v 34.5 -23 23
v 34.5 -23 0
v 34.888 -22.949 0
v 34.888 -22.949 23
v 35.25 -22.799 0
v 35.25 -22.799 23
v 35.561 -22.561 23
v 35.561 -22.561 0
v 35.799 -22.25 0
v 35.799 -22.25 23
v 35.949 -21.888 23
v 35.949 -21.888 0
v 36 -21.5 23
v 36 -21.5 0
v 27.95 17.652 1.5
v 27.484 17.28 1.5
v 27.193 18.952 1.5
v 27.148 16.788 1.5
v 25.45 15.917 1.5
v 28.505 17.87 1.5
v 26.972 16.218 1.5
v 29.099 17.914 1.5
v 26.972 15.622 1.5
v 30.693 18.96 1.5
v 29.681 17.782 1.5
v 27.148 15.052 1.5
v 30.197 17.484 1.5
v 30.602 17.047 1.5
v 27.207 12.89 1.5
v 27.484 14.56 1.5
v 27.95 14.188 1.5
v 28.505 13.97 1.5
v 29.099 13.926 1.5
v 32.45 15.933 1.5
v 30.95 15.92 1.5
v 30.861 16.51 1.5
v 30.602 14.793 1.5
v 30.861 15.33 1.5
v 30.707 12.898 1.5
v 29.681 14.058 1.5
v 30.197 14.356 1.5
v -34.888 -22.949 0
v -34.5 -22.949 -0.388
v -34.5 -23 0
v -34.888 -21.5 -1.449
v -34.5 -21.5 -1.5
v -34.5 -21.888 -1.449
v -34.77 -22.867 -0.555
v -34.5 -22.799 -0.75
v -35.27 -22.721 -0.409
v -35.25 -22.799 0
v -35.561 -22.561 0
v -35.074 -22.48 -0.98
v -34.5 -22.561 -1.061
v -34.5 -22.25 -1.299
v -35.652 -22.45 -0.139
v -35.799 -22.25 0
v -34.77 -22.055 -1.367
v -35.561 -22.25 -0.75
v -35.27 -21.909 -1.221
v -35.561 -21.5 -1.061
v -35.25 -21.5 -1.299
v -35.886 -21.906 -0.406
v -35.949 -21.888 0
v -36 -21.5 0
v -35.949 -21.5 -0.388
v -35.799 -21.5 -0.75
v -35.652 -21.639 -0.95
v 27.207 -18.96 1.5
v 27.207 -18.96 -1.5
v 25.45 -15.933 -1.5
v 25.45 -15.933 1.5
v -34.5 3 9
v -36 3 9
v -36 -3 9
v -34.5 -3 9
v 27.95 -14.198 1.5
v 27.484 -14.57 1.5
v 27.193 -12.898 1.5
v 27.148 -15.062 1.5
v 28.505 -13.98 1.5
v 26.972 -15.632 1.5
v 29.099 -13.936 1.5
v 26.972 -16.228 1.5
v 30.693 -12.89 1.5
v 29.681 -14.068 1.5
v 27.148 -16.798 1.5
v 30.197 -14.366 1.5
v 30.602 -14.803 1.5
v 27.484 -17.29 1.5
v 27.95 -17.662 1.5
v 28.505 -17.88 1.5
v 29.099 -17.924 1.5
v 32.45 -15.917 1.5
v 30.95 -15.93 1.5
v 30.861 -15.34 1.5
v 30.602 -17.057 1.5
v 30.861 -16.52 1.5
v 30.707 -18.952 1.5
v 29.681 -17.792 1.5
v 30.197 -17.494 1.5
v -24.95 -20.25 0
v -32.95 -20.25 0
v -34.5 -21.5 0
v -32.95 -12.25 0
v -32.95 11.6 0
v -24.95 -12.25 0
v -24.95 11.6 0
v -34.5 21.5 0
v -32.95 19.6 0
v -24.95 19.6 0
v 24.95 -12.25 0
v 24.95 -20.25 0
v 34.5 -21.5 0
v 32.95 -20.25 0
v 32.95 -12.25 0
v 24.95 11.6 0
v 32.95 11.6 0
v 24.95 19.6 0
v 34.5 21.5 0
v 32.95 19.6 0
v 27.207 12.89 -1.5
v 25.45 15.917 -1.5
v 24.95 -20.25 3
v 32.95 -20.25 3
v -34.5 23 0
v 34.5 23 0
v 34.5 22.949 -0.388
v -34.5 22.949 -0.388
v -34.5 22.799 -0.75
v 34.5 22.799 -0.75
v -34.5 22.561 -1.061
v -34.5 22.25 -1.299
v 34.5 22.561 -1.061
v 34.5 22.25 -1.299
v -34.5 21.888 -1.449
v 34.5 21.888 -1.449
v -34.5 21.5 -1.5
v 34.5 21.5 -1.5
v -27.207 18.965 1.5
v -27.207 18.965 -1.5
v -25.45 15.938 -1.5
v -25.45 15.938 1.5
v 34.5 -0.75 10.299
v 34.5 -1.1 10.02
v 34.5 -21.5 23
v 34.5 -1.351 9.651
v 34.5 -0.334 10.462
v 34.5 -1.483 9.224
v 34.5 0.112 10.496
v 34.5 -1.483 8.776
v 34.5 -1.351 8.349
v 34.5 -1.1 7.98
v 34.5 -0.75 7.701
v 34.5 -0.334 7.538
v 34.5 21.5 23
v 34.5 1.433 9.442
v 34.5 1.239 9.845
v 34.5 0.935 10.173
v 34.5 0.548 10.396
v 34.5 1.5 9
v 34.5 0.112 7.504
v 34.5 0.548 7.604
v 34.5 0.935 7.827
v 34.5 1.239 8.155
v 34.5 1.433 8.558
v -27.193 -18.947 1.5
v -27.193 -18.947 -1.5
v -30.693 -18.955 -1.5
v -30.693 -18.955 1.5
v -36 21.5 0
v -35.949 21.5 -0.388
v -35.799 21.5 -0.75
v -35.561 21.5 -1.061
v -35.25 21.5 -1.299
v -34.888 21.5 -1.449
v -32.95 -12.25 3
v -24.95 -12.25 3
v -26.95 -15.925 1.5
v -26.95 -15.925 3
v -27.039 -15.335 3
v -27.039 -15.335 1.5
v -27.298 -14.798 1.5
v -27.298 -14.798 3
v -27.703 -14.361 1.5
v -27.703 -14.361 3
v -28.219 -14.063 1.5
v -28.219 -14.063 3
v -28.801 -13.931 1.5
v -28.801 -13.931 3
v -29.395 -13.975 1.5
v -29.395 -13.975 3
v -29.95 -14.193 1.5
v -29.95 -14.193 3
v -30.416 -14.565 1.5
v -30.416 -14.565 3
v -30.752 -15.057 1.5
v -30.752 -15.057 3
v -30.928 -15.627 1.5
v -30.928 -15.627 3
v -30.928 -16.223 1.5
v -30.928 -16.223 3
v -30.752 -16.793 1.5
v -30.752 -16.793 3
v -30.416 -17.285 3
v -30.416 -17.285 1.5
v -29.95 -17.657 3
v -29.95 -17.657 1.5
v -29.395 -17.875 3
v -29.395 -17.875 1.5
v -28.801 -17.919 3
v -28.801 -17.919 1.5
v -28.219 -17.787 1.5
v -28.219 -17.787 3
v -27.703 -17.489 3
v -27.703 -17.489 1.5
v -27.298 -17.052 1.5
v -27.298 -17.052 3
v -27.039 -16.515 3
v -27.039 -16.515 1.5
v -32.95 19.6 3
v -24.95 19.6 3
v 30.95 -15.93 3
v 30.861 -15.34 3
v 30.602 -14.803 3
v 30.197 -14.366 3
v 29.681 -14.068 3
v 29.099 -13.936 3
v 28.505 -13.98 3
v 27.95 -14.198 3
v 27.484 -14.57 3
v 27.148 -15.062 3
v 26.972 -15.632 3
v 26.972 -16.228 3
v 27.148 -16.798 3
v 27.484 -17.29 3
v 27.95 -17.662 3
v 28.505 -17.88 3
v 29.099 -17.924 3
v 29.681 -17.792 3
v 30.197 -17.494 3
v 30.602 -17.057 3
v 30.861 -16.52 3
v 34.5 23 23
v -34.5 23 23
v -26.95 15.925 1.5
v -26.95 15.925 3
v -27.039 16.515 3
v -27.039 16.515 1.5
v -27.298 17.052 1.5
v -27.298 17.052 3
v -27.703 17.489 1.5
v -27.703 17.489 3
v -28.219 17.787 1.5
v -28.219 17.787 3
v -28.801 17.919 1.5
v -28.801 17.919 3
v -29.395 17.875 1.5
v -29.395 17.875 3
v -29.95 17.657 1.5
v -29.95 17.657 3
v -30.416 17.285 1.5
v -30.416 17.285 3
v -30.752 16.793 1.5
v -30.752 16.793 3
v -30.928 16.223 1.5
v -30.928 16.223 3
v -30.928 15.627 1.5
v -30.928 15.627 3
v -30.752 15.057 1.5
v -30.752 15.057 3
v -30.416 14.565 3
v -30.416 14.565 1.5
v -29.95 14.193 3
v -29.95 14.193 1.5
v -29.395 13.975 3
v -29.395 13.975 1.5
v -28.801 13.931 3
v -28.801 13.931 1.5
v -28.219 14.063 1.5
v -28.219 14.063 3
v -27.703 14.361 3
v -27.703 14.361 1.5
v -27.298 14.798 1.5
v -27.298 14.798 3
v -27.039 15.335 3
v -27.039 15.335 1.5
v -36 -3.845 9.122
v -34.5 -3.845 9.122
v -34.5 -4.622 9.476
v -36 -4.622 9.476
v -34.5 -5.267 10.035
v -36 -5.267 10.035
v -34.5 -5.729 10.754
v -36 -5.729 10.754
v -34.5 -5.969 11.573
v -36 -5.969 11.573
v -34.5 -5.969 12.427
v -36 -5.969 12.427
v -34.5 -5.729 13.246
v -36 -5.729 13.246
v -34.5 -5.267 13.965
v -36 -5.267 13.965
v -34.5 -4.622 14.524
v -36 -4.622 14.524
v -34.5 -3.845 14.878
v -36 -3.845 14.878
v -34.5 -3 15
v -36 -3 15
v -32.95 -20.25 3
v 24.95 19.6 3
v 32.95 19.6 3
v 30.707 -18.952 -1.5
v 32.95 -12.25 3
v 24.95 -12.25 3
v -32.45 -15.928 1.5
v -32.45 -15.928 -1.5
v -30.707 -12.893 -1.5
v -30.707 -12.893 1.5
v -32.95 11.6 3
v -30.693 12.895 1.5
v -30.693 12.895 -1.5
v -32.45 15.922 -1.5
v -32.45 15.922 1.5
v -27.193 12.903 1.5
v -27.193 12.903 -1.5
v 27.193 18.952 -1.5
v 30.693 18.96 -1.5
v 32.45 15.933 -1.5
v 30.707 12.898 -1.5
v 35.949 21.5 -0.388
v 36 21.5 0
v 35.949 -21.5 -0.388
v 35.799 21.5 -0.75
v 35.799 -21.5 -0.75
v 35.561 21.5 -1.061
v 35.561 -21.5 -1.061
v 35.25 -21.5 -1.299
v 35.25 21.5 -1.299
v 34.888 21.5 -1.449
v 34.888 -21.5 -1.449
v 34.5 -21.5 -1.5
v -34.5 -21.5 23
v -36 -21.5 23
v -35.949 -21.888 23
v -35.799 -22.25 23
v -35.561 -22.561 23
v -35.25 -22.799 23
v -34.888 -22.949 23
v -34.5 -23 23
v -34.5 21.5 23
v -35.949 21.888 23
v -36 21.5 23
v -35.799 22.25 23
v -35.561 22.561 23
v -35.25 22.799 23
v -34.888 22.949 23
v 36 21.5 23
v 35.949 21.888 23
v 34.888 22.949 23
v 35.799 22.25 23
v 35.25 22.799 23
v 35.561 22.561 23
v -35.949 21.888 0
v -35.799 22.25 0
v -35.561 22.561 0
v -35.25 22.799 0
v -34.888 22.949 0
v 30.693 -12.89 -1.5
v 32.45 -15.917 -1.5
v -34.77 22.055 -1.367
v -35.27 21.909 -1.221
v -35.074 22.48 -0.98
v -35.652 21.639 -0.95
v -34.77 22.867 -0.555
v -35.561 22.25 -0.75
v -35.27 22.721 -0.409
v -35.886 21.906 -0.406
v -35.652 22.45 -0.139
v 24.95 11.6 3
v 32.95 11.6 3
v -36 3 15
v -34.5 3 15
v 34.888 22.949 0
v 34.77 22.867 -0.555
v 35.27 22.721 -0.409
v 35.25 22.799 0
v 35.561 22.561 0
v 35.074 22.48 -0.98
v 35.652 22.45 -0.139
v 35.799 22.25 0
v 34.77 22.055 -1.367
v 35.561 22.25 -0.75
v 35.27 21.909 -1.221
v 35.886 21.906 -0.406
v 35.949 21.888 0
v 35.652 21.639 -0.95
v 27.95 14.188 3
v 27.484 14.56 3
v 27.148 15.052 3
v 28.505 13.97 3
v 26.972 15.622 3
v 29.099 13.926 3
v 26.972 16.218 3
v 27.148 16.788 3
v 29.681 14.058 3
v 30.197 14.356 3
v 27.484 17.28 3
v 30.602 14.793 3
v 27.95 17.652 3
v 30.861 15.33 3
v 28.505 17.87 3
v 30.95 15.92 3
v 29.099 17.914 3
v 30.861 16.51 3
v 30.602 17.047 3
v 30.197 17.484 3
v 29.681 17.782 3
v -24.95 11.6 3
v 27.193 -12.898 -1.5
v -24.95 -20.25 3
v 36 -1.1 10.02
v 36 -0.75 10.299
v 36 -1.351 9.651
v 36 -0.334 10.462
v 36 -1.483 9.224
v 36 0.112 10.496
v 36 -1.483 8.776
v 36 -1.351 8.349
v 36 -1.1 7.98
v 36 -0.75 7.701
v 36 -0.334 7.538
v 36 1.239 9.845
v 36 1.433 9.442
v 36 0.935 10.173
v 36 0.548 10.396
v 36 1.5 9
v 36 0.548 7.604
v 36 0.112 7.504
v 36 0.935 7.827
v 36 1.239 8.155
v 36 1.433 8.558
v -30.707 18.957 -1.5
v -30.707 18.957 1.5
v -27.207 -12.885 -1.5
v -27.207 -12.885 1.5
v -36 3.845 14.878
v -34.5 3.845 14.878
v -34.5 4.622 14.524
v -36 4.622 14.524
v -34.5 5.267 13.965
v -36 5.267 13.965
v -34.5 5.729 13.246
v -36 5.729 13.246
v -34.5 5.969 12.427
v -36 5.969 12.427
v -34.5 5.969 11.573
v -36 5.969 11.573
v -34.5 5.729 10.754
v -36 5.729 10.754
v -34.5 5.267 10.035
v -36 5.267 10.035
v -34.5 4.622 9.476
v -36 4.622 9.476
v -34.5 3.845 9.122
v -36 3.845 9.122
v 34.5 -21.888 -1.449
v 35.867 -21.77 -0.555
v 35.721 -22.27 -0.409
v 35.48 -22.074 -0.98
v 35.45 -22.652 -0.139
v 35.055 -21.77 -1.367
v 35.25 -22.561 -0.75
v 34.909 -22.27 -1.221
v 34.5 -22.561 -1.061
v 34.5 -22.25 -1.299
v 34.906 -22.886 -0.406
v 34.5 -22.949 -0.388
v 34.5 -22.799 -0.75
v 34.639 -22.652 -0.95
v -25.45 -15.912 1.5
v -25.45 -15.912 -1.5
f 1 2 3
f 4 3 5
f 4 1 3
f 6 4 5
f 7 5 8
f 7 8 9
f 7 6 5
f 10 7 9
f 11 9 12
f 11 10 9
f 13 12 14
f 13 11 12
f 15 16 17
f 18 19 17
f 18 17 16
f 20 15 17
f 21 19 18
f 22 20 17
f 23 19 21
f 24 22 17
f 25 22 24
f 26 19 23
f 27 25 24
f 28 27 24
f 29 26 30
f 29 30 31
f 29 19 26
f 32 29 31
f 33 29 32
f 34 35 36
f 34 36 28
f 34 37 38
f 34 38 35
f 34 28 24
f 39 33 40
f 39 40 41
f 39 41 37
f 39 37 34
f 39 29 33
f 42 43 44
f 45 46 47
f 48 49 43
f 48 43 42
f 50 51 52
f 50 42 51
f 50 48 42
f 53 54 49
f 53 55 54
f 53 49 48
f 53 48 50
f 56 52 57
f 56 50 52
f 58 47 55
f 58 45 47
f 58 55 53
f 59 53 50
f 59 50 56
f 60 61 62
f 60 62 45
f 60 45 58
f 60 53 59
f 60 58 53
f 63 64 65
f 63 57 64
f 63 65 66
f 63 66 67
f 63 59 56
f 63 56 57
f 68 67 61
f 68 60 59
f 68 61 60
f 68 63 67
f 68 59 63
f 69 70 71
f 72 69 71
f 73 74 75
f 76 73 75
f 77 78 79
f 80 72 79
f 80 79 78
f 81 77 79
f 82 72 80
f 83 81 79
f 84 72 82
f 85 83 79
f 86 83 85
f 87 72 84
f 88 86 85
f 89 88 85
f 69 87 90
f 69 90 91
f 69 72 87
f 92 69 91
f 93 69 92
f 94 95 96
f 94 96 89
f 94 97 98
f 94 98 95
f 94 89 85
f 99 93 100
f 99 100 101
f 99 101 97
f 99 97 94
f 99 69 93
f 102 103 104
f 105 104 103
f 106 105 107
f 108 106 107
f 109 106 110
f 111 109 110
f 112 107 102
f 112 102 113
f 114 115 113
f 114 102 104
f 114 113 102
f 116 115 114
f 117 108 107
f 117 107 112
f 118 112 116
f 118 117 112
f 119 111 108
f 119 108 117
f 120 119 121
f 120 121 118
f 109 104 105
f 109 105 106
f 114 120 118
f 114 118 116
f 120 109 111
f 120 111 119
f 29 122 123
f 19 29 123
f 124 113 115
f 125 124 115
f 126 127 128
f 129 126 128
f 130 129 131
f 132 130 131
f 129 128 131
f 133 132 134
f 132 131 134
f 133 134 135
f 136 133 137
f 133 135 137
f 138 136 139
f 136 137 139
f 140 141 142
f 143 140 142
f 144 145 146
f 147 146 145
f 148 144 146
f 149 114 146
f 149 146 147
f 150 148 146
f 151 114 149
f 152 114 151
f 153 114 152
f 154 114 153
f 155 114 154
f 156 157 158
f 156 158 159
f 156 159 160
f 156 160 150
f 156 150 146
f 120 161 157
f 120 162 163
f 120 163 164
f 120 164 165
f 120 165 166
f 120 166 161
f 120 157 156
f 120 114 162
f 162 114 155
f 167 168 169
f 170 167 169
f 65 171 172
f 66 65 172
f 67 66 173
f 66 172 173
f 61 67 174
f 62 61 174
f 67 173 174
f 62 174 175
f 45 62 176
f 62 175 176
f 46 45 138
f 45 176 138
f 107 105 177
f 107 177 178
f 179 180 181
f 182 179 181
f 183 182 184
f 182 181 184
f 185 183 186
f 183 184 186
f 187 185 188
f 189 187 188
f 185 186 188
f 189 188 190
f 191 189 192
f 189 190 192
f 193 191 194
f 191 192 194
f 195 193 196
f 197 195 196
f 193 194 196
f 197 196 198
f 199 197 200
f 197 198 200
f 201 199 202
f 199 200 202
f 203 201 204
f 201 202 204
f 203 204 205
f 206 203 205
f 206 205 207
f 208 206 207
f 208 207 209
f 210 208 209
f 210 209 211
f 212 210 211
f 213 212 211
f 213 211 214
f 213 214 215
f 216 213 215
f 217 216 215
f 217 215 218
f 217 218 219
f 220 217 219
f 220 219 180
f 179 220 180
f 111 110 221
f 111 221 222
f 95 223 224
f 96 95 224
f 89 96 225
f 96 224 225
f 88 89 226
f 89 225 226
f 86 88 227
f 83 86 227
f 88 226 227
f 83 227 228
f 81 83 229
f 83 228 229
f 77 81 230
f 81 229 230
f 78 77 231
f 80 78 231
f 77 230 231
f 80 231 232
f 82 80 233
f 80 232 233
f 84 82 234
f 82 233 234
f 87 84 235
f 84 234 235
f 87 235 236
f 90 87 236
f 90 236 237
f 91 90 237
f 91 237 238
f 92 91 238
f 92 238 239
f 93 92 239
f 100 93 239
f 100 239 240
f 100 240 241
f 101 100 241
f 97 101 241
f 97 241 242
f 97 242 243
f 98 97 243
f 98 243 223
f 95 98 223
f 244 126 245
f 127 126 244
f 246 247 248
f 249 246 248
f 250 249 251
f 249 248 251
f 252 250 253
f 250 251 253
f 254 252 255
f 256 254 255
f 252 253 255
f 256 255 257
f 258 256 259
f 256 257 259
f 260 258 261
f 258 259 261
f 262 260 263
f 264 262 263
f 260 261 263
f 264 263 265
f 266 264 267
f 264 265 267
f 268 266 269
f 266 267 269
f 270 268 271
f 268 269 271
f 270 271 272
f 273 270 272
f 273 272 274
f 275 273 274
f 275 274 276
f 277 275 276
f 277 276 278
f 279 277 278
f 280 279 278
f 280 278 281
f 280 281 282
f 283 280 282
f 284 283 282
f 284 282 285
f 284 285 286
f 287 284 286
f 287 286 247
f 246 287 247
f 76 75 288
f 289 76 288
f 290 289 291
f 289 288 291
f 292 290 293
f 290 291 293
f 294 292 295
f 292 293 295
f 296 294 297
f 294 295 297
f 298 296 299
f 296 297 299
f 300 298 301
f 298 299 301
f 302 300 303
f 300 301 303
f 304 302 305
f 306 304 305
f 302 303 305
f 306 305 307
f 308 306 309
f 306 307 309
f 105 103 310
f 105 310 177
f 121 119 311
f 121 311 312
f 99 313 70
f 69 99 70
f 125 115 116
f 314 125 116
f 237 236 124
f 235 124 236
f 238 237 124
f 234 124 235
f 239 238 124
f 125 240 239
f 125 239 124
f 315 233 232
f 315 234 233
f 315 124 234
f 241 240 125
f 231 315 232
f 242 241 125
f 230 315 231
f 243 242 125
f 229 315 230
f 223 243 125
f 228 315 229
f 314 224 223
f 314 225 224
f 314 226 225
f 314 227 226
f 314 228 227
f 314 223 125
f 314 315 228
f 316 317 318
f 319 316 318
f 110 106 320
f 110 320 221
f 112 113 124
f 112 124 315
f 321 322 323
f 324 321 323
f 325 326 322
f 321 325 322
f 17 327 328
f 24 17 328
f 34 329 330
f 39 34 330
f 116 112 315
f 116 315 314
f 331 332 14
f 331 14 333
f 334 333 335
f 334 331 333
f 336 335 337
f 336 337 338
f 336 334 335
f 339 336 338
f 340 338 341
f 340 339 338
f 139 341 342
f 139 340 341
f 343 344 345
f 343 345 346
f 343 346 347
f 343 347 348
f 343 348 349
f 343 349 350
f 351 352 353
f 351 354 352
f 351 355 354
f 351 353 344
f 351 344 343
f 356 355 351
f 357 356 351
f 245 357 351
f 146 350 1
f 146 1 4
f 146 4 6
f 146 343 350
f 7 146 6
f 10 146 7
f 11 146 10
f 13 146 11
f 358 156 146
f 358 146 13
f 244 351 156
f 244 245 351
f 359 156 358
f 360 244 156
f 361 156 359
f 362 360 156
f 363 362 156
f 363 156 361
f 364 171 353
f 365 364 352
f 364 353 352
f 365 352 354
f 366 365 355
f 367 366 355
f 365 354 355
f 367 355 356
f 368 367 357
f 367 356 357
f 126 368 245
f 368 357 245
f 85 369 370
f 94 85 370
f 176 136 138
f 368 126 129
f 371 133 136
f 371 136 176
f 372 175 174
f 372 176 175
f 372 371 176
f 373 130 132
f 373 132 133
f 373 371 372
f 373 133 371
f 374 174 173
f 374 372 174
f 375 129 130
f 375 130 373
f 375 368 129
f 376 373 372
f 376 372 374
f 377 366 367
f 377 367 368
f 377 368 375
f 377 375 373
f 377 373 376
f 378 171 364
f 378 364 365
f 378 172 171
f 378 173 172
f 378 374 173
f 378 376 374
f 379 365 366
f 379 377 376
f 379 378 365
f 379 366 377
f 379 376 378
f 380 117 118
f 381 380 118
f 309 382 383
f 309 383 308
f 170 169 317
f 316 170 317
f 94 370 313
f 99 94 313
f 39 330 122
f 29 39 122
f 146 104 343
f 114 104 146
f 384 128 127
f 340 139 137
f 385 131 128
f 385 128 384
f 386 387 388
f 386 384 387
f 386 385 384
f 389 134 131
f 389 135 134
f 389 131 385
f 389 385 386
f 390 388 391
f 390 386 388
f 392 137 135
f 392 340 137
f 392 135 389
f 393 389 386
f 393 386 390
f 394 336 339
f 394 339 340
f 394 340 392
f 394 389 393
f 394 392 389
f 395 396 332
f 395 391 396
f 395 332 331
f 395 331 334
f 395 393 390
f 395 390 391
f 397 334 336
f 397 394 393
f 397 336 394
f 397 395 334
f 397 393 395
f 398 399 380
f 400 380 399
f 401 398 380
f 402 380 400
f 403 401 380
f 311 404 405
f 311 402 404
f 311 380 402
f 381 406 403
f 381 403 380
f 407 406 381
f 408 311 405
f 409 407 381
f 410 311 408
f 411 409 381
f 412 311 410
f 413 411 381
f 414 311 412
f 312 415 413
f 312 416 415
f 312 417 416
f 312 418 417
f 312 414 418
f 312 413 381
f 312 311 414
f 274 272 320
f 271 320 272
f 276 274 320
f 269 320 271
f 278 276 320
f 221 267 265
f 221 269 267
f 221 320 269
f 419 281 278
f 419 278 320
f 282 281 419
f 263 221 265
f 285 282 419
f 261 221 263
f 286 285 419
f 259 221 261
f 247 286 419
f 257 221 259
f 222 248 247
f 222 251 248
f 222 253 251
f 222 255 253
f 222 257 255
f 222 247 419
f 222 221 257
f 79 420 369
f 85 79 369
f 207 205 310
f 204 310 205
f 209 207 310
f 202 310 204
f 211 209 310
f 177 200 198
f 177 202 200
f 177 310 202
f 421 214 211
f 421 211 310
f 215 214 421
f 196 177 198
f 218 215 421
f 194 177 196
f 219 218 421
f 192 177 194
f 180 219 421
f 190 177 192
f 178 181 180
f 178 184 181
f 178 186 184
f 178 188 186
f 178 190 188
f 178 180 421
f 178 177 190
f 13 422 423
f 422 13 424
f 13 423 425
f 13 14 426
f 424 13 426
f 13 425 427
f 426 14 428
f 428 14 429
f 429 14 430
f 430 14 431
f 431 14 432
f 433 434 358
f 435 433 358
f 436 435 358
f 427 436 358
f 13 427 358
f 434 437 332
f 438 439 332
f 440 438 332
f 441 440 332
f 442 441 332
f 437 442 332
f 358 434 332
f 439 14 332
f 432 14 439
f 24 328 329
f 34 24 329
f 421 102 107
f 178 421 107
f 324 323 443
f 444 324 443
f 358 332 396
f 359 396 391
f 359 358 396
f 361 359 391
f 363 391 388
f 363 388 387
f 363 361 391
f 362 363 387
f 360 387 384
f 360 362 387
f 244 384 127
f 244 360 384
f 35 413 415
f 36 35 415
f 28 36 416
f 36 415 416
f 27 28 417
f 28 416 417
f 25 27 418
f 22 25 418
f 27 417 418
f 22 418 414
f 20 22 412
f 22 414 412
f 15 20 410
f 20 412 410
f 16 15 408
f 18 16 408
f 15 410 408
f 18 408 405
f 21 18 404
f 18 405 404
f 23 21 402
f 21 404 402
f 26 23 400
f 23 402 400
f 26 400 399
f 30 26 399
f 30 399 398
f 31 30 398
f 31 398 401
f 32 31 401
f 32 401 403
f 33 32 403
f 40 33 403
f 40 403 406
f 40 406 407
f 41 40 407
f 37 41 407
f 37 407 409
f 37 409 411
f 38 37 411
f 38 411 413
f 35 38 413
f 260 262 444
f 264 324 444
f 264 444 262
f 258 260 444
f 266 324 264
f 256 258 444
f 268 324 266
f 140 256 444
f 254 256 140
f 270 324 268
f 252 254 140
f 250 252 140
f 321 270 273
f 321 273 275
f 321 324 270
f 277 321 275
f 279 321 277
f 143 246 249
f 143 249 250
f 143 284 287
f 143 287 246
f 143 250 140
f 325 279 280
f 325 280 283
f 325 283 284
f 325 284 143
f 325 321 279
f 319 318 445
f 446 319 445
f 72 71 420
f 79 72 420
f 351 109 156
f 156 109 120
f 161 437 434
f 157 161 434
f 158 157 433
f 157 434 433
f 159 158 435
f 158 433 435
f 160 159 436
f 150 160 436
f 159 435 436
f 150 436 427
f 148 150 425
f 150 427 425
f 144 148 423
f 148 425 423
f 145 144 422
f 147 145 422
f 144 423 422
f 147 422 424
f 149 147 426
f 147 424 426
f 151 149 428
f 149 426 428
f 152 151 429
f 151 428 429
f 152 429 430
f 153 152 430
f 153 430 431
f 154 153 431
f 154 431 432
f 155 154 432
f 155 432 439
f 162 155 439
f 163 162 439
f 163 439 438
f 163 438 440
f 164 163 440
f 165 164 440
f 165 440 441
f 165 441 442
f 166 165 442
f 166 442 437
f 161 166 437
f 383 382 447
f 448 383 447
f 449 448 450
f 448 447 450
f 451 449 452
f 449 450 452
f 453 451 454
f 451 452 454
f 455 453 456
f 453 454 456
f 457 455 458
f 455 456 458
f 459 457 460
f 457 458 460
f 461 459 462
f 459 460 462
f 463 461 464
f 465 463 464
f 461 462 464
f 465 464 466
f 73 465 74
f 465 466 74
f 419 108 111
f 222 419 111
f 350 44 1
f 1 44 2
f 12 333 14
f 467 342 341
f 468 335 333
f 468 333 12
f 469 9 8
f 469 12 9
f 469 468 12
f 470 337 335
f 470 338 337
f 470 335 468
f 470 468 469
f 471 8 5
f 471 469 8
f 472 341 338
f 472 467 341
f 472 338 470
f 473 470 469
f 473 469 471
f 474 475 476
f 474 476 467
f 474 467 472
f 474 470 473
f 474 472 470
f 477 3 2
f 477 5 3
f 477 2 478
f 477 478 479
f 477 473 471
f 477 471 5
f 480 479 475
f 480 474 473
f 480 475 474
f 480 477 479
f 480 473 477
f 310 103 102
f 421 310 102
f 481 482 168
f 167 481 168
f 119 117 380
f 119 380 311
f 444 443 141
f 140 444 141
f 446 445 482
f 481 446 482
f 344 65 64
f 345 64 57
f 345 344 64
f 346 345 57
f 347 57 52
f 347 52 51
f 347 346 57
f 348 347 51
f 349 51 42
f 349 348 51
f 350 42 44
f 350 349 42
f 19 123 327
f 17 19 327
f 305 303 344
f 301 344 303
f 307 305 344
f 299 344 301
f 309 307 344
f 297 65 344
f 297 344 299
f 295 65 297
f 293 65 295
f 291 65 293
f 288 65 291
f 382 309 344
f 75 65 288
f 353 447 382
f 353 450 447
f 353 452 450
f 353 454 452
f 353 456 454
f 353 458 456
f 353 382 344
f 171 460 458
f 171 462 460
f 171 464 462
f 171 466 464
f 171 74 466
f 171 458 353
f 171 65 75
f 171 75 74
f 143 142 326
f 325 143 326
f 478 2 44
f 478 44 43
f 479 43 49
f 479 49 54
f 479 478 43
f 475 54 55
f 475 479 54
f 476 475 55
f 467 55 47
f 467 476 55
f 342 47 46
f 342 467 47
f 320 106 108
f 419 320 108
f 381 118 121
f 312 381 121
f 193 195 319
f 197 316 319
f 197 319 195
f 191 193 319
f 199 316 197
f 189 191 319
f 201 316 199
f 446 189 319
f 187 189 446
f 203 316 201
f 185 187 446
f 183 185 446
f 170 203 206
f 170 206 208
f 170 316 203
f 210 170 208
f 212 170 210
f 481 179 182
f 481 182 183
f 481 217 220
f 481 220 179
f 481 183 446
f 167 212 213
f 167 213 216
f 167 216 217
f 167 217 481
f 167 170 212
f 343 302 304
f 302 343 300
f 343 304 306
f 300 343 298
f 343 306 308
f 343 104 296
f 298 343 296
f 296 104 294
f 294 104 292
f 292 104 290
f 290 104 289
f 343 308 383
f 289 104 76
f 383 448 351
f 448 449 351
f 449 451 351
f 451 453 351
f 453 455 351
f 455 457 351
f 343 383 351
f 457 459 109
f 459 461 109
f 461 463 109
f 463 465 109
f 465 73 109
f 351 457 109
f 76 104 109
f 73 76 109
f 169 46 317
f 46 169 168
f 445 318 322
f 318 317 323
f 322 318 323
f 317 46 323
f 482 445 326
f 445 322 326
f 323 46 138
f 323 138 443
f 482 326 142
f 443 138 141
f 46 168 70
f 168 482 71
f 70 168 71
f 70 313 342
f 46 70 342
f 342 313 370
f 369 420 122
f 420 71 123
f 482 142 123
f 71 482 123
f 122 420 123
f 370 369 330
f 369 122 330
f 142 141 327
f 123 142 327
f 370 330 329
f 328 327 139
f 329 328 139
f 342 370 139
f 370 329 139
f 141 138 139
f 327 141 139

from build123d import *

# Parameters (mm, degrees)
SKETCH_W        = 69
SKETCH_H        = 43
PAD_DEPTH       = 23
THICKNESS_T     = 1.5
SKETCH001_R     = 1.5
HOLE_DEPTH      = 2.098709
HOLE_TIPS_R     = 1.5
POCKET_DEPTH    = 5
SKETCH003_W     = 8
SKETCH003_H     = 8
PAD001_DEPTH    = 3
SKETCH004_R     = 2
HOLE001_DEPTH   = 6
POCKET001_DEPTH = 3


with BuildPart() as part:
    # Sketch → Pad (new body)
    with BuildSketch(Plane.XY):
        Rectangle(SKETCH_W, SKETCH_H)
    extrude(amount=PAD_DEPTH)

    # Thickness
    thickness_openings = [part.faces().sort_by_distance(p)[0] for p in [
        (0, 0, 23),
    ]]
    offset(amount=THICKNESS_T, openings=thickness_openings)

    # Sketch001 (on Face10 of Thickness) → Hole (cut)
    with BuildSketch(Plane.YZ.offset(36)):
        with Locations((0, 9)):
            Circle(SKETCH001_R)
    extrude(amount=-HOLE_DEPTH, mode=Mode.SUBTRACT)

    # Hole tips → Hole tip 1 section 0
    with BuildSketch(Plane.YZ.offset(33.901291), mode=Mode.PRIVATE) as hole_tip_1_s0:
        with Locations((0, 9)):
            Circle(HOLE_TIPS_R)
    loft([hole_tip_1_s0.sketch, Vertex(33, 0, 9)], mode=Mode.SUBTRACT)

    # Sketch002 (on Face9 of Hole) → Pocket (cut)
    with BuildSketch(Plane(origin=(-36, 0, 0), x_dir=(0, -1, 0), z_dir=(-1, 0, 0))):
        with BuildLine():
            ThreePointArc((-3, 15), (-6, 12), (-3, 9))
            Line((-3, 9), (3, 9))
            ThreePointArc((3, 9), (6, 12), (3, 15))
            Line((-3, 15), (3, 15))
        make_face()
    extrude(amount=-POCKET_DEPTH, mode=Mode.SUBTRACT)

    # Sketch003 (on Face4 of Pocket) → Pad001 (join)
    with BuildSketch(Plane.XY):
        with Locations((-28.95, 15.6)):
            Rectangle(SKETCH003_W, SKETCH003_H)
        with Locations((28.95, 15.6)):
            Rectangle(SKETCH003_W, SKETCH003_H)
        with Locations((-28.95, -16.25)):
            Rectangle(SKETCH003_W, SKETCH003_H)
        with Locations((28.95, -16.25)):
            Rectangle(SKETCH003_W, SKETCH003_H)
    extrude(amount=PAD001_DEPTH)

    # Sketch004 (on Face38 of Pad001) → Hole001 (cut)
    with BuildSketch(Plane.XY.offset(3)):
        with Locations((-28.95, 15.925)):
            Circle(SKETCH004_R)
        with Locations((28.95, 15.92)):
            Circle(SKETCH004_R)
        with Locations((-28.95, -15.925)):
            Circle(SKETCH004_R)
        with Locations((28.95, -15.93)):
            Circle(SKETCH004_R)
    extrude(amount=-HOLE001_DEPTH, mode=Mode.SUBTRACT)

    # Sketch005 (on Face52 of Hole001) → Pocket001 (cut)
    with BuildSketch(Plane(origin=(0, 0, -1.5), x_dir=(1, 0, 0), z_dir=(0, 0, -1))):
        Polygon((-27.206792, 12.885), (-25.450009, 15.912163), (-27.193217, 18.947163), (-30.693208, 18.955), (-32.449991, 15.927837), (-30.706783, 12.892837), align=None)
        Polygon((30.693208, 12.89), (32.449991, 15.917163), (30.706783, 18.952163), (27.206792, 18.96), (25.450009, 15.932837), (27.193217, 12.897837), align=None)
        Polygon((-27.206792, -18.965), (-25.450009, -15.937837), (-27.193217, -12.902837), (-30.693208, -12.895), (-32.449991, -15.922163), (-30.706783, -18.957163), align=None)
        Polygon((30.693208, -18.96), (32.449991, -15.932837), (30.706783, -12.897837), (27.206792, -12.89), (25.450009, -15.917163), (27.193217, -18.952163), align=None)
    extrude(amount=-POCKET001_DEPTH, mode=Mode.SUBTRACT)


solid = part.part
